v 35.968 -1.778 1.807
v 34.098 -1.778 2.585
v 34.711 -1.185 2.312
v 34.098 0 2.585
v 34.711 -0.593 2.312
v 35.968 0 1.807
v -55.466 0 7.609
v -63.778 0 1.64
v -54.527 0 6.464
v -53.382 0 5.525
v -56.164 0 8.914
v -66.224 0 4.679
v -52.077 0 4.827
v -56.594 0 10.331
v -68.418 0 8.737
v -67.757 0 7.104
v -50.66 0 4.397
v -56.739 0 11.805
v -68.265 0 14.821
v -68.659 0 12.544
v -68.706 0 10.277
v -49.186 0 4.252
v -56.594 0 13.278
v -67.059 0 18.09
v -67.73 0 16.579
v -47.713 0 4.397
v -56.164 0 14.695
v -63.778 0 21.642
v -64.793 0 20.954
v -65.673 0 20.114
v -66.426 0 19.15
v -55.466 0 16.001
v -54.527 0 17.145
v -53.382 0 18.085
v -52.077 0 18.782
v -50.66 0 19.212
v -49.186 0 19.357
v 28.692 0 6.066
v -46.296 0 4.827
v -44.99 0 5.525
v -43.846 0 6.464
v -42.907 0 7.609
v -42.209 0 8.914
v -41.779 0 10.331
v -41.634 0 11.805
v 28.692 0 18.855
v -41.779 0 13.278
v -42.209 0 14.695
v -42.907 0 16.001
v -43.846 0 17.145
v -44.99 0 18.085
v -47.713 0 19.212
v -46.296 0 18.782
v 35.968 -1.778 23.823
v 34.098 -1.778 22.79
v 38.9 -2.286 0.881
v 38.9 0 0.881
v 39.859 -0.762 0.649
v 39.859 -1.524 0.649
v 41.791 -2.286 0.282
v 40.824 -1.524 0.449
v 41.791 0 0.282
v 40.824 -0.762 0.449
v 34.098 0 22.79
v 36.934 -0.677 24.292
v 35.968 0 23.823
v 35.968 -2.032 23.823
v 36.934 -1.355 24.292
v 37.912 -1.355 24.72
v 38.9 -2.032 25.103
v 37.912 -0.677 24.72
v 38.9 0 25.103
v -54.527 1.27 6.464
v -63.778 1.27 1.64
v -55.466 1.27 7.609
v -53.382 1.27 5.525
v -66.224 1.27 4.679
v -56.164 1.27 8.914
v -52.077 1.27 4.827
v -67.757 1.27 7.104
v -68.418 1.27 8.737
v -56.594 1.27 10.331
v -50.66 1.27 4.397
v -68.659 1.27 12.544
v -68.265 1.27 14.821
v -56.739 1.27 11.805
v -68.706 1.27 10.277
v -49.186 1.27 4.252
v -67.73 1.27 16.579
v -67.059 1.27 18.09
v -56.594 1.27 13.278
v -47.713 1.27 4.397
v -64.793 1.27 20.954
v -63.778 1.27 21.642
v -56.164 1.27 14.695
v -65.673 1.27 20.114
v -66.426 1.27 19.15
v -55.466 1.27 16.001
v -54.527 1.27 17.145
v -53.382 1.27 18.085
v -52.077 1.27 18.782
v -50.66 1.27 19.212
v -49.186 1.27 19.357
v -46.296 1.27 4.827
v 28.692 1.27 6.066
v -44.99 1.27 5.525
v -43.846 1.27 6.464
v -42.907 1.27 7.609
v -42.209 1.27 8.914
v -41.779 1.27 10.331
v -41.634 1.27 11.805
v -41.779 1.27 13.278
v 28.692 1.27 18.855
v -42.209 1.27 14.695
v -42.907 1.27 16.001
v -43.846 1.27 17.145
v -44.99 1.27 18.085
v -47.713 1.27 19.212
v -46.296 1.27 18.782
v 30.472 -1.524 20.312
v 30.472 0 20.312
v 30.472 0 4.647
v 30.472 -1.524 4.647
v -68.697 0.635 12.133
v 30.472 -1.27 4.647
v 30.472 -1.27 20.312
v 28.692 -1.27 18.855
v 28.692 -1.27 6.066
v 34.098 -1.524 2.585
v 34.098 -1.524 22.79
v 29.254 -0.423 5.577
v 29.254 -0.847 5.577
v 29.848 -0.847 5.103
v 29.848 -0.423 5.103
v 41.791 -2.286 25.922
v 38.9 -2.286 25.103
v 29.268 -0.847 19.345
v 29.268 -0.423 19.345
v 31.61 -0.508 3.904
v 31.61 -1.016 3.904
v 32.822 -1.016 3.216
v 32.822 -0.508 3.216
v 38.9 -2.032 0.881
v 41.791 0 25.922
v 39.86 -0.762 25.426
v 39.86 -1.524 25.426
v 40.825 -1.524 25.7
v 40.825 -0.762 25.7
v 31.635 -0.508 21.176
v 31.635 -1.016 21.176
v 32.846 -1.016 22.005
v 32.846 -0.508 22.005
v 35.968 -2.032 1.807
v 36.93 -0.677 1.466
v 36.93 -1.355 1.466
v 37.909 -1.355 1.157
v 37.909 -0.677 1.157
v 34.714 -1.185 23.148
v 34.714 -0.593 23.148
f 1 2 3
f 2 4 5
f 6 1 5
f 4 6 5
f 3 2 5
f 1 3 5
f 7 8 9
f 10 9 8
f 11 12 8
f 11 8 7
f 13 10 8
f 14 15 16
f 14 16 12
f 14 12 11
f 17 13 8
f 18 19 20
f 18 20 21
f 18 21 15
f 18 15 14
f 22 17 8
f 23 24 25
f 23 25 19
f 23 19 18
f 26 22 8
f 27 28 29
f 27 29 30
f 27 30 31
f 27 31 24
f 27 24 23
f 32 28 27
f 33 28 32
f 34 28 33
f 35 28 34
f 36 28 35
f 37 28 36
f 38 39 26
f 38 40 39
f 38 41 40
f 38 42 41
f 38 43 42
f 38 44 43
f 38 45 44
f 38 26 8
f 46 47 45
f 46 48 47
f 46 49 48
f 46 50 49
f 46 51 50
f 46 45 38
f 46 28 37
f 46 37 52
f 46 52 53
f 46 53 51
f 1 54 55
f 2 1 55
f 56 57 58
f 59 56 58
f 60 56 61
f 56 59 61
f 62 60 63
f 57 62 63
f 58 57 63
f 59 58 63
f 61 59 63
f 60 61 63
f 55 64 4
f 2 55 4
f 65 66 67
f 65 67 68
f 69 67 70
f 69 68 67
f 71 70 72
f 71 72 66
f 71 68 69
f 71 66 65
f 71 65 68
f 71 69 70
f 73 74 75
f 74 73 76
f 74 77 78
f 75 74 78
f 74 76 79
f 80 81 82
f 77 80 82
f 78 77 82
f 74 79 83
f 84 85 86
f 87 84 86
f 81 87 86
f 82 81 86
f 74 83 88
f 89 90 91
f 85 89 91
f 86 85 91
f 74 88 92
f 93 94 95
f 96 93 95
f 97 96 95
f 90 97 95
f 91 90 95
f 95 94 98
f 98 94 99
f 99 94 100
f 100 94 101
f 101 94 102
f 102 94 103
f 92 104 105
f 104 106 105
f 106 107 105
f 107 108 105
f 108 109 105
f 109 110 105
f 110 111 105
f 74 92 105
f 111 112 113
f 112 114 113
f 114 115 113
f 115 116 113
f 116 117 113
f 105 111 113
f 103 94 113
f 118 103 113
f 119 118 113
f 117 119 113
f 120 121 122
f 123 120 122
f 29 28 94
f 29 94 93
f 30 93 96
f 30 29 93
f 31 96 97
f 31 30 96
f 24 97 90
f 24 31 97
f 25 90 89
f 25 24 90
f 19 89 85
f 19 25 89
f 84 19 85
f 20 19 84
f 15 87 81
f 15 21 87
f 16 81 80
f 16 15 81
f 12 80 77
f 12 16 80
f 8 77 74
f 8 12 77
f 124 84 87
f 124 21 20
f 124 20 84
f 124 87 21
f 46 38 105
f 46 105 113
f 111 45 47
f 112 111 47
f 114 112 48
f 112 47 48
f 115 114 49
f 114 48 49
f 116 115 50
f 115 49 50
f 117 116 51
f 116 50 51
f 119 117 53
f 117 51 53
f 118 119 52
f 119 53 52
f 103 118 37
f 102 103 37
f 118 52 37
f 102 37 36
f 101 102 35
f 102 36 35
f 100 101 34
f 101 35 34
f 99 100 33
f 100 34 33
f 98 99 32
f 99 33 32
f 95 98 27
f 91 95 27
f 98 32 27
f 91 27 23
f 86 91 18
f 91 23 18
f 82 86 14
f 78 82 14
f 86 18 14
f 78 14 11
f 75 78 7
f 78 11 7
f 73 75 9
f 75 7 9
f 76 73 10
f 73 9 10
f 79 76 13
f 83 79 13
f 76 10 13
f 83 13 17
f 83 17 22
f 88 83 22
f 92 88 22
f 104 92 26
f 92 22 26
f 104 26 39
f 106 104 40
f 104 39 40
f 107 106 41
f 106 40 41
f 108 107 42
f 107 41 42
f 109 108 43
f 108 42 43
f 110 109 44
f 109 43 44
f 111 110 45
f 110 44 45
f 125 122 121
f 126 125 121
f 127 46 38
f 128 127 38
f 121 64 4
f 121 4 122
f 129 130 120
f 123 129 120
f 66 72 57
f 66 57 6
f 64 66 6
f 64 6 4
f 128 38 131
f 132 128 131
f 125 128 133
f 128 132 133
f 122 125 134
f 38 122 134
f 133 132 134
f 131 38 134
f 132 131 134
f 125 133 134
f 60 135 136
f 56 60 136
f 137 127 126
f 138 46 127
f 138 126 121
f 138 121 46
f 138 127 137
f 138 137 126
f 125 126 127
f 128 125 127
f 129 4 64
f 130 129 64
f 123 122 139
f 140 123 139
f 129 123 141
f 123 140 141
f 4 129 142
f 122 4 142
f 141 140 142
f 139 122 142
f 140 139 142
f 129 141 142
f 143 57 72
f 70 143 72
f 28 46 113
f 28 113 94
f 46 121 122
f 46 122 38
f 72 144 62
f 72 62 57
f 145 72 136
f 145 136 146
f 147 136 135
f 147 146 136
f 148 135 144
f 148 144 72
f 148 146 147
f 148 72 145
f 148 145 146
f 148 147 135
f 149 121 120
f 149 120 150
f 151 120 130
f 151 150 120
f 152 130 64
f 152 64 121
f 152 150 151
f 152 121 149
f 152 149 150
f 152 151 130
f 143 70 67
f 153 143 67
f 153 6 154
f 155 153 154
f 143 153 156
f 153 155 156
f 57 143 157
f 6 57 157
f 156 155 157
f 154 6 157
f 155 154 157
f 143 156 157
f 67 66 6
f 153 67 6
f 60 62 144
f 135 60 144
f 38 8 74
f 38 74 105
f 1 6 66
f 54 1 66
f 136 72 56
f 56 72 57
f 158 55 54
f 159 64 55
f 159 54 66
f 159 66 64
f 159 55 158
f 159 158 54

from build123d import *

# Parameters (mm, degrees)
F0_R     = 7.5526113457
F1_DEPTH = 1.27
F2_DEPTH = 1.27
F3_DEPTH = 1.524
F5_DEPTH = 1.778
F4_DEPTH = 2.032
F6_DEPTH = 2.286


with BuildPart() as f1:
    # F0 (on Front) → F1 (new body)
    with BuildSketch(Plane.XZ):
        with BuildLine():
            Line((28.6921095103, 18.8548155129), (-63.7784600258, 21.6420497745))
            add(Edge.make_bspline(
                [(-63.7784600258, 21.6420497745), (-67.1079200773, 19.793095453), (-69.8225721368, 10.7812830644), (-68.075440342, 6.652690484), (-63.7784600258, 1.6395491548)],
                knots=[0, 0, 0, 0, 0.4900994273, 1, 1, 1, 1], degree=3))
            Line((-63.7784600258, 1.6395491548), (28.6921095103, 6.0663321055))
            Line((28.6921095103, 6.0663321055), (28.6921095103, 18.8548155129))
        make_face()
        with Locations((-49.186475575, 11.8047548458)):
            Circle(F0_R, mode=Mode.SUBTRACT)
    extrude(amount=-F1_DEPTH)

    # F0 (on Front) → F2 (join)
    with BuildSketch(Plane.XZ):
        with BuildLine():
            add(Edge.make_bspline(
                [(28.6921095103, 18.8548155129), (29.2586134161, 19.3464303872), (29.8532963087, 19.8345850052), (30.4717893599, 20.3119263251)],
                knots=[0, 0, 0, 0, 0.063445116, 0.063445116, 0.063445116, 0.063445116], degree=3))
            Line((28.6921095103, 18.8548155129), (28.6921095103, 6.0663321055))
            add(Edge.make_bspline(
                [(28.6921095103, 6.0663321055), (29.2374306887, 5.5684302801), (29.8335393262, 5.0945577706), (30.4717893599, 4.6471812289)],
                knots=[0, 0, 0, 0, 0.0689819558, 0.0689819558, 0.0689819558, 0.0689819558], degree=3))
            Line((30.4717893599, 4.6471812289), (30.4717893599, 20.3119263251))
        make_face()
    extrude(amount=F2_DEPTH)


with BuildPart() as f3:
    # F0 (on Front) → F3 (new body)
    with BuildSketch(Plane.XZ):
        with BuildLine():
            add(Edge.make_bspline(
                [(30.4717893599, 20.3119263251), (31.6090095116, 21.1896114782), (32.8267270412, 22.0307390364), (34.0977841778, 22.7896005813)],
                knots=[0.063445116, 0.063445116, 0.063445116, 0.063445116, 0.1801013408, 0.1801013408, 0.1801013408, 0.1801013408], degree=3))
            Line((30.4717893599, 20.3119263251), (30.4717893599, 4.6471812289))
            add(Edge.make_bspline(
                [(30.4717893599, 4.6471812289), (31.5703112732, 3.8771805888), (32.7936705756, 3.1856701684), (34.0977841778, 2.5852265171)],
                knots=[0.0689819558, 0.0689819558, 0.0689819558, 0.0689819558, 0.1877100185, 0.1877100185, 0.1877100185, 0.1877100185], degree=3))
            Line((34.0977841778, 2.5852265171), (34.0977841778, 22.7896005813))
        make_face()
    extrude(amount=F3_DEPTH)


with BuildPart() as f5:
    # F0 (on Front) → F5 (new body)
    with BuildSketch(Plane.XZ):
        with BuildLine():
            add(Edge.make_bspline(
                [(34.0977841778, 22.7896005813), (34.7096884179, 23.1549268783), (35.3339545969, 23.5011872789), (35.9675526682, 23.823282004)],
                knots=[0.1801013408, 0.1801013408, 0.1801013408, 0.1801013408, 0.2362612384, 0.2362612384, 0.2362612384, 0.2362612384], degree=3))
            Line((34.0977841778, 22.7896005813), (34.0977841778, 2.5852265171))
            add(Edge.make_bspline(
                [(34.0977841778, 2.5852265171), (34.7050155047, 2.3056433623), (35.329755098, 2.0458043109), (35.9675526682, 1.8069789945)],
                knots=[0.1877100185, 0.1877100185, 0.1877100185, 0.1877100185, 0.2429930851, 0.2429930851, 0.2429930851, 0.2429930851], degree=3))
            Line((35.9675526682, 1.8069789945), (35.9675526682, 23.823282004))
        make_face()
    extrude(amount=F5_DEPTH)


with BuildPart() as f4:
    # F0 (on Front) → F4 (new body)
    with BuildSketch(Plane.XZ):
        with BuildLine():
            add(Edge.make_bspline(
                [(35.9675526682, 23.823282004), (36.9272706816, 24.3111624501), (37.9083993188, 24.7435983877), (38.9004083297, 25.1028666727)],
                knots=[0.2362612384, 0.2362612384, 0.2362612384, 0.2362612384, 0.321327257, 0.321327257, 0.321327257, 0.321327257], degree=3))
            Line((35.9675526682, 23.823282004), (35.9675526682, 1.8069789945))
            add(Edge.make_bspline(
                [(35.9675526682, 1.8069789945), (36.9209481001, 1.4499770611), (37.903521585, 1.1399303244), (38.9004083297, 0.88107959)],
                knots=[0.2429930851, 0.2429930851, 0.2429930851, 0.2429930851, 0.3256315672, 0.3256315672, 0.3256315672, 0.3256315672], degree=3))
            Line((38.9004083297, 0.88107959), (38.9004083297, 25.1028666727))
        make_face()
    extrude(amount=F4_DEPTH)


with BuildPart() as f6:
    # F0 (on Front) → F6 (new body)
    with BuildSketch(Plane.XZ):
        with BuildLine():
            add(Edge.make_bspline(
                [(38.9004083297, 25.1028666727), (39.8571112277, 25.4493484141), (40.8239338052, 25.7277779717), (41.7914306023, 25.9222579794)],
                knots=[0.321327257, 0.321327257, 0.321327257, 0.321327257, 0.4033657321, 0.4033657321, 0.4033657321, 0.4033657321], degree=3))
            Line((38.9004083297, 25.1028666727), (38.9004083297, 0.88107959))
            add(Edge.make_bspline(
                [(38.9004083297, 0.88107959), (39.8553043694, 0.633132125), (40.8233332625, 0.4321585571), (41.7914306023, 0.2818860558)],
                knots=[0.3256315672, 0.3256315672, 0.3256315672, 0.3256315672, 0.4047891644, 0.4047891644, 0.4047891644, 0.4047891644], degree=3))
            Line((41.7914306023, 0.2818860558), (41.7914306023, 25.9222579794))
        make_face()
    extrude(amount=F6_DEPTH)


solid = Compound([f1.part, f3.part, f5.part, f4.part, f6.part])
